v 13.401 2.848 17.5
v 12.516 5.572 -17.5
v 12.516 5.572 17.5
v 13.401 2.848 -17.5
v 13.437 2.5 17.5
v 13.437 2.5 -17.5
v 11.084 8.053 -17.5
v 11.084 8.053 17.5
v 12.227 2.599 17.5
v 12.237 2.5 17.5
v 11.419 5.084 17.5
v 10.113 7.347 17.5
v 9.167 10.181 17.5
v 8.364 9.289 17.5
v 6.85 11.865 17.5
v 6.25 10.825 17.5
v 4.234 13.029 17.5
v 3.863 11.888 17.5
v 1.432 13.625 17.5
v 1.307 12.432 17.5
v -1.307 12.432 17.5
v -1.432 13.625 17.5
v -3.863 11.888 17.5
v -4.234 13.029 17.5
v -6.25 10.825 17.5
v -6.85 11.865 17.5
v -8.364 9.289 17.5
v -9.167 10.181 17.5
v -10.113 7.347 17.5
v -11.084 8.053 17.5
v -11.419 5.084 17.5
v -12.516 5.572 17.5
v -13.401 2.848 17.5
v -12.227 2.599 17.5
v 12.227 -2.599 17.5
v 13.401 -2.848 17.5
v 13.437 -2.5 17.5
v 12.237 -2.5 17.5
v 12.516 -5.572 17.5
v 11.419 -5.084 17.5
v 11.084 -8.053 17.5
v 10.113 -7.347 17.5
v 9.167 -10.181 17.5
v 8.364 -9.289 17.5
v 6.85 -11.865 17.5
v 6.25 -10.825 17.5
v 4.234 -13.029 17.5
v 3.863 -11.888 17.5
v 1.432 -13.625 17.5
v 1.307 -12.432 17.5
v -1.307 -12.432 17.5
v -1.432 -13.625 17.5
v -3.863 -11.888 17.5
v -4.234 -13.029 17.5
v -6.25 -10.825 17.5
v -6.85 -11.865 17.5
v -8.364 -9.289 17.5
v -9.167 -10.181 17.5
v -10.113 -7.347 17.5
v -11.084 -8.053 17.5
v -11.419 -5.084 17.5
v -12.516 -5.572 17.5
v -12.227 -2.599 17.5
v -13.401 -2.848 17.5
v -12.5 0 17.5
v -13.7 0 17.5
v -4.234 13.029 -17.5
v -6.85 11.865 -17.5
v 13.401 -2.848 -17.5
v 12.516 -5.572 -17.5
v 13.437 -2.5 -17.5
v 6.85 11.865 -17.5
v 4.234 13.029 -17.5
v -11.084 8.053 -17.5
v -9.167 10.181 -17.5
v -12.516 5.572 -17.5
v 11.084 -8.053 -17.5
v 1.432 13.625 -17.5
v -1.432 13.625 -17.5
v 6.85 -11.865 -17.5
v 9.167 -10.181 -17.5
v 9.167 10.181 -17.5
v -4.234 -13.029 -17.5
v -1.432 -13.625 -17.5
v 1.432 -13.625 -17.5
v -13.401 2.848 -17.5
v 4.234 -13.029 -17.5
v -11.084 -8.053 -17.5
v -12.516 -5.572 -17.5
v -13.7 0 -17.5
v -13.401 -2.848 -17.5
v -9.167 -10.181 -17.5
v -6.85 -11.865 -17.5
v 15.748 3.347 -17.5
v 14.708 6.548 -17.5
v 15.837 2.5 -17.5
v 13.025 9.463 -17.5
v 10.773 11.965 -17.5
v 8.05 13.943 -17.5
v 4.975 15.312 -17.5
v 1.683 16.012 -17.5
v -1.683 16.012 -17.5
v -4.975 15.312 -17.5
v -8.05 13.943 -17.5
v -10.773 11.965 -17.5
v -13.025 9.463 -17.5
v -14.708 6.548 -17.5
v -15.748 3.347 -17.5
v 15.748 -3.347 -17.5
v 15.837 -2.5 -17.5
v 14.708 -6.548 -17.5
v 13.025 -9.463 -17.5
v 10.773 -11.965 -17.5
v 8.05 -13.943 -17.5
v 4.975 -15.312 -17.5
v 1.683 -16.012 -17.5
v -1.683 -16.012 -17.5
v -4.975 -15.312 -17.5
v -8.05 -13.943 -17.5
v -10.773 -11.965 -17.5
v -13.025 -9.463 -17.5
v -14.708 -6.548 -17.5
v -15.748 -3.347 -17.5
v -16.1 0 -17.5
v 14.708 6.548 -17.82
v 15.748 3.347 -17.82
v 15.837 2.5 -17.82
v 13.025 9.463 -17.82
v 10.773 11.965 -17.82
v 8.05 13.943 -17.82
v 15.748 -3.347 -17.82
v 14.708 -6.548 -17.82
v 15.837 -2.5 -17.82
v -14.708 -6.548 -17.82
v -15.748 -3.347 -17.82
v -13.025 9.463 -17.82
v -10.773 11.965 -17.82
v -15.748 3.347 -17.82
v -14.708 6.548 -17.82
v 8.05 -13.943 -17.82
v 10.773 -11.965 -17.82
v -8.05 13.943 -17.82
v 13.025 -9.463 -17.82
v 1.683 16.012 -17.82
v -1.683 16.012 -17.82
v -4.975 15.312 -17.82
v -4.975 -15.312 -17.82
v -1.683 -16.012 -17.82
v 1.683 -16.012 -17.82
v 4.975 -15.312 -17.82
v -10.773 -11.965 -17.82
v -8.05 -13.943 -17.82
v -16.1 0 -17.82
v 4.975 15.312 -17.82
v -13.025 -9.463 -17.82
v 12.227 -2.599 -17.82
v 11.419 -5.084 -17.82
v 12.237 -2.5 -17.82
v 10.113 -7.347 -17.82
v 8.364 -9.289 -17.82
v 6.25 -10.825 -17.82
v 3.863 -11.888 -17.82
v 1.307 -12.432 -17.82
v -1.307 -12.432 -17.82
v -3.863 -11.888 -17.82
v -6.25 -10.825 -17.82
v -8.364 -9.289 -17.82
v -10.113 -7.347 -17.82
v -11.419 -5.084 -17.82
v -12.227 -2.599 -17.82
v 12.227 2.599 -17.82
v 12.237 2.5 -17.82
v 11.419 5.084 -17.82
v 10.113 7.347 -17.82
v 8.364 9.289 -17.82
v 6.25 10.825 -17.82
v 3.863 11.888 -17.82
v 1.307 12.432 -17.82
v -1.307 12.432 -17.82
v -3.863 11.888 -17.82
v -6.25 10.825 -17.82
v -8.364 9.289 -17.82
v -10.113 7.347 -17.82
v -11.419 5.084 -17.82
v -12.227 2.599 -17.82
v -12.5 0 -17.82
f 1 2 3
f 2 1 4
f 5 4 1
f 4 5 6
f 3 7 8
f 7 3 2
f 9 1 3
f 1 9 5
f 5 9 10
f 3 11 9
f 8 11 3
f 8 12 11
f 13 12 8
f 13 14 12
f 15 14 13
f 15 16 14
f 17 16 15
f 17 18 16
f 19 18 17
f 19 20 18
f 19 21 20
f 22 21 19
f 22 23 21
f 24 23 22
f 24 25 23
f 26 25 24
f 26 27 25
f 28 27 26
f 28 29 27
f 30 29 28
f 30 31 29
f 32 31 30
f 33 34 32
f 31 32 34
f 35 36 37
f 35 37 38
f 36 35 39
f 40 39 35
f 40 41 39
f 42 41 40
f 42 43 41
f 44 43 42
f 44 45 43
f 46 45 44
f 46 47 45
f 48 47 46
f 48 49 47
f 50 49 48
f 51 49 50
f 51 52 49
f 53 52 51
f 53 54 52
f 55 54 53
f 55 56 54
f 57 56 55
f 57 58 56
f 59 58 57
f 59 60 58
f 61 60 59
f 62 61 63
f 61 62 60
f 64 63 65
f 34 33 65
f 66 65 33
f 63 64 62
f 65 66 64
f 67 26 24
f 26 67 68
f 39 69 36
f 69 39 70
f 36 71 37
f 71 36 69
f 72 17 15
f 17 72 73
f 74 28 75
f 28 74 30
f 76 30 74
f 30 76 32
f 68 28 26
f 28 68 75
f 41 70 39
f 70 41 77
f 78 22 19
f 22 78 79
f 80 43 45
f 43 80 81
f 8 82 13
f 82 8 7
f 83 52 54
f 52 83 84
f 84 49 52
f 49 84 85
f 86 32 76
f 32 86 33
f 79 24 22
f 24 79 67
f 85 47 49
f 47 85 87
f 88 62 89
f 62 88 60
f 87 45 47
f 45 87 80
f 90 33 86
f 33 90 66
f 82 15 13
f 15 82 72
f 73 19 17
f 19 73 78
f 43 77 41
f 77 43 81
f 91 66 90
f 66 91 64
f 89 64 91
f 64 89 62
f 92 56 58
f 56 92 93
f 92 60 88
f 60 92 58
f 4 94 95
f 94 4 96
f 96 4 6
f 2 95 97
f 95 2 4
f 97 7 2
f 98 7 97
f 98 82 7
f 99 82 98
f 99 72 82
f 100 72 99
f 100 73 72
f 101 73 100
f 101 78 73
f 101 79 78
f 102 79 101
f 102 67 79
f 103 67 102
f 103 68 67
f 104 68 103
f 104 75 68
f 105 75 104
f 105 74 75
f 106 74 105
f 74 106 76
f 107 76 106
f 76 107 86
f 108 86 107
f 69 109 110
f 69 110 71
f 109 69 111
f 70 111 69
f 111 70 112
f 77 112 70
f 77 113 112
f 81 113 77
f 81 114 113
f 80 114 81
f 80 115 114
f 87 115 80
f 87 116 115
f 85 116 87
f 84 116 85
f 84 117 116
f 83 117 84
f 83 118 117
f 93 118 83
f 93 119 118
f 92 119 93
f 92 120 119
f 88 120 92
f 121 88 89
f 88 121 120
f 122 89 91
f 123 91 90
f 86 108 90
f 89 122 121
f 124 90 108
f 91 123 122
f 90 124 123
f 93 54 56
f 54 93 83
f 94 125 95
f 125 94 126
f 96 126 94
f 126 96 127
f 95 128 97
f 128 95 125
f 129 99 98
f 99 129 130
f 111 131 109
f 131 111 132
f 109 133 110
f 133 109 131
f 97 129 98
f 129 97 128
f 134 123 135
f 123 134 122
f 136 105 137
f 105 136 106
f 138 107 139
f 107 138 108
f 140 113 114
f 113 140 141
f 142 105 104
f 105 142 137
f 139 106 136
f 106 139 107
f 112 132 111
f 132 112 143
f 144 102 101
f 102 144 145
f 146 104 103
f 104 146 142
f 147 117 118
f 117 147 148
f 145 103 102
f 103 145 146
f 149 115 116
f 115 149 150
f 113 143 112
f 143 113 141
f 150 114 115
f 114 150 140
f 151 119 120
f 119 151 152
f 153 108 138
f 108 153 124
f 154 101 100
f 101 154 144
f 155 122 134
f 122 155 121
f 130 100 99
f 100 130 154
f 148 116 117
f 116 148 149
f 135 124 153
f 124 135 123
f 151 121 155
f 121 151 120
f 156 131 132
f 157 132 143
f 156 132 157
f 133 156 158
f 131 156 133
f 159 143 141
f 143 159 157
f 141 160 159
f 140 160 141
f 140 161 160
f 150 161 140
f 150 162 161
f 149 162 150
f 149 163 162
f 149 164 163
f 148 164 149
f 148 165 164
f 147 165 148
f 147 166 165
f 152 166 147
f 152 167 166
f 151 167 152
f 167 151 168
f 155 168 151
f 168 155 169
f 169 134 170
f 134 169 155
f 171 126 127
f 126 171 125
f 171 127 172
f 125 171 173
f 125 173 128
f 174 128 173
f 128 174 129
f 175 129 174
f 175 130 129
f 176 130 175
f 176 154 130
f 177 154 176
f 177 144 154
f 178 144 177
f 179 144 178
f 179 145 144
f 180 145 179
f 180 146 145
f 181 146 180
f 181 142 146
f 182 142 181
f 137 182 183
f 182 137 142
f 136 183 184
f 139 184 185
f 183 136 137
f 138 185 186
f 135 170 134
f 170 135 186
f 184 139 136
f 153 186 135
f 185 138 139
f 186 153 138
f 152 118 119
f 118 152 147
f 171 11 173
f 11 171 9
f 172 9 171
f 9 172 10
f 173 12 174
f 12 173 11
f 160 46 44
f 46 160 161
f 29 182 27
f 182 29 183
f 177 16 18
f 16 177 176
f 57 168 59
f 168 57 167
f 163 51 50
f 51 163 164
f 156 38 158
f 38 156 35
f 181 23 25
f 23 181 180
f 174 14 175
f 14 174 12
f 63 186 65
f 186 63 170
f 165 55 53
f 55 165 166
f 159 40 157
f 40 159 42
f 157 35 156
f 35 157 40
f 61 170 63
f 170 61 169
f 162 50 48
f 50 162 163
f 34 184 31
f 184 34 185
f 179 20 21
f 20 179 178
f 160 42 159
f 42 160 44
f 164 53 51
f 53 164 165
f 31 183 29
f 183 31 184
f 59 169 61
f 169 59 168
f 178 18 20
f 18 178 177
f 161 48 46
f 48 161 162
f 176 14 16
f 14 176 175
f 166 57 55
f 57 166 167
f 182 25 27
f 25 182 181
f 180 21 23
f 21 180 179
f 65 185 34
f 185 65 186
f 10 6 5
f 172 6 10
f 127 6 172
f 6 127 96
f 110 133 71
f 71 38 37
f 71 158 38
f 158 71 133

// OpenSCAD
layer_height = 0.16;
wall_thickness = 1.2;

innen_durchmesser = 25;
laenge            = 35;

difference() {
    union() {
        cylinder(
            d = innen_durchmesser + wall_thickness * 2,
            h = laenge,
            center = true
        );
        translate([0, 0, (laenge + layer_height * 2) / -2]) {
            cylinder(
                d = innen_durchmesser + wall_thickness * 6,
                h = layer_height * 2,
                center = true
            );
        }
    }

    union() {
        cylinder(d = innen_durchmesser, h = laenge * 1.1, center = true);

        translate([innen_durchmesser / 2, 0, 0]) {
            cube([10, 5, laenge * 1.1], center = true);
        }
    }
}
